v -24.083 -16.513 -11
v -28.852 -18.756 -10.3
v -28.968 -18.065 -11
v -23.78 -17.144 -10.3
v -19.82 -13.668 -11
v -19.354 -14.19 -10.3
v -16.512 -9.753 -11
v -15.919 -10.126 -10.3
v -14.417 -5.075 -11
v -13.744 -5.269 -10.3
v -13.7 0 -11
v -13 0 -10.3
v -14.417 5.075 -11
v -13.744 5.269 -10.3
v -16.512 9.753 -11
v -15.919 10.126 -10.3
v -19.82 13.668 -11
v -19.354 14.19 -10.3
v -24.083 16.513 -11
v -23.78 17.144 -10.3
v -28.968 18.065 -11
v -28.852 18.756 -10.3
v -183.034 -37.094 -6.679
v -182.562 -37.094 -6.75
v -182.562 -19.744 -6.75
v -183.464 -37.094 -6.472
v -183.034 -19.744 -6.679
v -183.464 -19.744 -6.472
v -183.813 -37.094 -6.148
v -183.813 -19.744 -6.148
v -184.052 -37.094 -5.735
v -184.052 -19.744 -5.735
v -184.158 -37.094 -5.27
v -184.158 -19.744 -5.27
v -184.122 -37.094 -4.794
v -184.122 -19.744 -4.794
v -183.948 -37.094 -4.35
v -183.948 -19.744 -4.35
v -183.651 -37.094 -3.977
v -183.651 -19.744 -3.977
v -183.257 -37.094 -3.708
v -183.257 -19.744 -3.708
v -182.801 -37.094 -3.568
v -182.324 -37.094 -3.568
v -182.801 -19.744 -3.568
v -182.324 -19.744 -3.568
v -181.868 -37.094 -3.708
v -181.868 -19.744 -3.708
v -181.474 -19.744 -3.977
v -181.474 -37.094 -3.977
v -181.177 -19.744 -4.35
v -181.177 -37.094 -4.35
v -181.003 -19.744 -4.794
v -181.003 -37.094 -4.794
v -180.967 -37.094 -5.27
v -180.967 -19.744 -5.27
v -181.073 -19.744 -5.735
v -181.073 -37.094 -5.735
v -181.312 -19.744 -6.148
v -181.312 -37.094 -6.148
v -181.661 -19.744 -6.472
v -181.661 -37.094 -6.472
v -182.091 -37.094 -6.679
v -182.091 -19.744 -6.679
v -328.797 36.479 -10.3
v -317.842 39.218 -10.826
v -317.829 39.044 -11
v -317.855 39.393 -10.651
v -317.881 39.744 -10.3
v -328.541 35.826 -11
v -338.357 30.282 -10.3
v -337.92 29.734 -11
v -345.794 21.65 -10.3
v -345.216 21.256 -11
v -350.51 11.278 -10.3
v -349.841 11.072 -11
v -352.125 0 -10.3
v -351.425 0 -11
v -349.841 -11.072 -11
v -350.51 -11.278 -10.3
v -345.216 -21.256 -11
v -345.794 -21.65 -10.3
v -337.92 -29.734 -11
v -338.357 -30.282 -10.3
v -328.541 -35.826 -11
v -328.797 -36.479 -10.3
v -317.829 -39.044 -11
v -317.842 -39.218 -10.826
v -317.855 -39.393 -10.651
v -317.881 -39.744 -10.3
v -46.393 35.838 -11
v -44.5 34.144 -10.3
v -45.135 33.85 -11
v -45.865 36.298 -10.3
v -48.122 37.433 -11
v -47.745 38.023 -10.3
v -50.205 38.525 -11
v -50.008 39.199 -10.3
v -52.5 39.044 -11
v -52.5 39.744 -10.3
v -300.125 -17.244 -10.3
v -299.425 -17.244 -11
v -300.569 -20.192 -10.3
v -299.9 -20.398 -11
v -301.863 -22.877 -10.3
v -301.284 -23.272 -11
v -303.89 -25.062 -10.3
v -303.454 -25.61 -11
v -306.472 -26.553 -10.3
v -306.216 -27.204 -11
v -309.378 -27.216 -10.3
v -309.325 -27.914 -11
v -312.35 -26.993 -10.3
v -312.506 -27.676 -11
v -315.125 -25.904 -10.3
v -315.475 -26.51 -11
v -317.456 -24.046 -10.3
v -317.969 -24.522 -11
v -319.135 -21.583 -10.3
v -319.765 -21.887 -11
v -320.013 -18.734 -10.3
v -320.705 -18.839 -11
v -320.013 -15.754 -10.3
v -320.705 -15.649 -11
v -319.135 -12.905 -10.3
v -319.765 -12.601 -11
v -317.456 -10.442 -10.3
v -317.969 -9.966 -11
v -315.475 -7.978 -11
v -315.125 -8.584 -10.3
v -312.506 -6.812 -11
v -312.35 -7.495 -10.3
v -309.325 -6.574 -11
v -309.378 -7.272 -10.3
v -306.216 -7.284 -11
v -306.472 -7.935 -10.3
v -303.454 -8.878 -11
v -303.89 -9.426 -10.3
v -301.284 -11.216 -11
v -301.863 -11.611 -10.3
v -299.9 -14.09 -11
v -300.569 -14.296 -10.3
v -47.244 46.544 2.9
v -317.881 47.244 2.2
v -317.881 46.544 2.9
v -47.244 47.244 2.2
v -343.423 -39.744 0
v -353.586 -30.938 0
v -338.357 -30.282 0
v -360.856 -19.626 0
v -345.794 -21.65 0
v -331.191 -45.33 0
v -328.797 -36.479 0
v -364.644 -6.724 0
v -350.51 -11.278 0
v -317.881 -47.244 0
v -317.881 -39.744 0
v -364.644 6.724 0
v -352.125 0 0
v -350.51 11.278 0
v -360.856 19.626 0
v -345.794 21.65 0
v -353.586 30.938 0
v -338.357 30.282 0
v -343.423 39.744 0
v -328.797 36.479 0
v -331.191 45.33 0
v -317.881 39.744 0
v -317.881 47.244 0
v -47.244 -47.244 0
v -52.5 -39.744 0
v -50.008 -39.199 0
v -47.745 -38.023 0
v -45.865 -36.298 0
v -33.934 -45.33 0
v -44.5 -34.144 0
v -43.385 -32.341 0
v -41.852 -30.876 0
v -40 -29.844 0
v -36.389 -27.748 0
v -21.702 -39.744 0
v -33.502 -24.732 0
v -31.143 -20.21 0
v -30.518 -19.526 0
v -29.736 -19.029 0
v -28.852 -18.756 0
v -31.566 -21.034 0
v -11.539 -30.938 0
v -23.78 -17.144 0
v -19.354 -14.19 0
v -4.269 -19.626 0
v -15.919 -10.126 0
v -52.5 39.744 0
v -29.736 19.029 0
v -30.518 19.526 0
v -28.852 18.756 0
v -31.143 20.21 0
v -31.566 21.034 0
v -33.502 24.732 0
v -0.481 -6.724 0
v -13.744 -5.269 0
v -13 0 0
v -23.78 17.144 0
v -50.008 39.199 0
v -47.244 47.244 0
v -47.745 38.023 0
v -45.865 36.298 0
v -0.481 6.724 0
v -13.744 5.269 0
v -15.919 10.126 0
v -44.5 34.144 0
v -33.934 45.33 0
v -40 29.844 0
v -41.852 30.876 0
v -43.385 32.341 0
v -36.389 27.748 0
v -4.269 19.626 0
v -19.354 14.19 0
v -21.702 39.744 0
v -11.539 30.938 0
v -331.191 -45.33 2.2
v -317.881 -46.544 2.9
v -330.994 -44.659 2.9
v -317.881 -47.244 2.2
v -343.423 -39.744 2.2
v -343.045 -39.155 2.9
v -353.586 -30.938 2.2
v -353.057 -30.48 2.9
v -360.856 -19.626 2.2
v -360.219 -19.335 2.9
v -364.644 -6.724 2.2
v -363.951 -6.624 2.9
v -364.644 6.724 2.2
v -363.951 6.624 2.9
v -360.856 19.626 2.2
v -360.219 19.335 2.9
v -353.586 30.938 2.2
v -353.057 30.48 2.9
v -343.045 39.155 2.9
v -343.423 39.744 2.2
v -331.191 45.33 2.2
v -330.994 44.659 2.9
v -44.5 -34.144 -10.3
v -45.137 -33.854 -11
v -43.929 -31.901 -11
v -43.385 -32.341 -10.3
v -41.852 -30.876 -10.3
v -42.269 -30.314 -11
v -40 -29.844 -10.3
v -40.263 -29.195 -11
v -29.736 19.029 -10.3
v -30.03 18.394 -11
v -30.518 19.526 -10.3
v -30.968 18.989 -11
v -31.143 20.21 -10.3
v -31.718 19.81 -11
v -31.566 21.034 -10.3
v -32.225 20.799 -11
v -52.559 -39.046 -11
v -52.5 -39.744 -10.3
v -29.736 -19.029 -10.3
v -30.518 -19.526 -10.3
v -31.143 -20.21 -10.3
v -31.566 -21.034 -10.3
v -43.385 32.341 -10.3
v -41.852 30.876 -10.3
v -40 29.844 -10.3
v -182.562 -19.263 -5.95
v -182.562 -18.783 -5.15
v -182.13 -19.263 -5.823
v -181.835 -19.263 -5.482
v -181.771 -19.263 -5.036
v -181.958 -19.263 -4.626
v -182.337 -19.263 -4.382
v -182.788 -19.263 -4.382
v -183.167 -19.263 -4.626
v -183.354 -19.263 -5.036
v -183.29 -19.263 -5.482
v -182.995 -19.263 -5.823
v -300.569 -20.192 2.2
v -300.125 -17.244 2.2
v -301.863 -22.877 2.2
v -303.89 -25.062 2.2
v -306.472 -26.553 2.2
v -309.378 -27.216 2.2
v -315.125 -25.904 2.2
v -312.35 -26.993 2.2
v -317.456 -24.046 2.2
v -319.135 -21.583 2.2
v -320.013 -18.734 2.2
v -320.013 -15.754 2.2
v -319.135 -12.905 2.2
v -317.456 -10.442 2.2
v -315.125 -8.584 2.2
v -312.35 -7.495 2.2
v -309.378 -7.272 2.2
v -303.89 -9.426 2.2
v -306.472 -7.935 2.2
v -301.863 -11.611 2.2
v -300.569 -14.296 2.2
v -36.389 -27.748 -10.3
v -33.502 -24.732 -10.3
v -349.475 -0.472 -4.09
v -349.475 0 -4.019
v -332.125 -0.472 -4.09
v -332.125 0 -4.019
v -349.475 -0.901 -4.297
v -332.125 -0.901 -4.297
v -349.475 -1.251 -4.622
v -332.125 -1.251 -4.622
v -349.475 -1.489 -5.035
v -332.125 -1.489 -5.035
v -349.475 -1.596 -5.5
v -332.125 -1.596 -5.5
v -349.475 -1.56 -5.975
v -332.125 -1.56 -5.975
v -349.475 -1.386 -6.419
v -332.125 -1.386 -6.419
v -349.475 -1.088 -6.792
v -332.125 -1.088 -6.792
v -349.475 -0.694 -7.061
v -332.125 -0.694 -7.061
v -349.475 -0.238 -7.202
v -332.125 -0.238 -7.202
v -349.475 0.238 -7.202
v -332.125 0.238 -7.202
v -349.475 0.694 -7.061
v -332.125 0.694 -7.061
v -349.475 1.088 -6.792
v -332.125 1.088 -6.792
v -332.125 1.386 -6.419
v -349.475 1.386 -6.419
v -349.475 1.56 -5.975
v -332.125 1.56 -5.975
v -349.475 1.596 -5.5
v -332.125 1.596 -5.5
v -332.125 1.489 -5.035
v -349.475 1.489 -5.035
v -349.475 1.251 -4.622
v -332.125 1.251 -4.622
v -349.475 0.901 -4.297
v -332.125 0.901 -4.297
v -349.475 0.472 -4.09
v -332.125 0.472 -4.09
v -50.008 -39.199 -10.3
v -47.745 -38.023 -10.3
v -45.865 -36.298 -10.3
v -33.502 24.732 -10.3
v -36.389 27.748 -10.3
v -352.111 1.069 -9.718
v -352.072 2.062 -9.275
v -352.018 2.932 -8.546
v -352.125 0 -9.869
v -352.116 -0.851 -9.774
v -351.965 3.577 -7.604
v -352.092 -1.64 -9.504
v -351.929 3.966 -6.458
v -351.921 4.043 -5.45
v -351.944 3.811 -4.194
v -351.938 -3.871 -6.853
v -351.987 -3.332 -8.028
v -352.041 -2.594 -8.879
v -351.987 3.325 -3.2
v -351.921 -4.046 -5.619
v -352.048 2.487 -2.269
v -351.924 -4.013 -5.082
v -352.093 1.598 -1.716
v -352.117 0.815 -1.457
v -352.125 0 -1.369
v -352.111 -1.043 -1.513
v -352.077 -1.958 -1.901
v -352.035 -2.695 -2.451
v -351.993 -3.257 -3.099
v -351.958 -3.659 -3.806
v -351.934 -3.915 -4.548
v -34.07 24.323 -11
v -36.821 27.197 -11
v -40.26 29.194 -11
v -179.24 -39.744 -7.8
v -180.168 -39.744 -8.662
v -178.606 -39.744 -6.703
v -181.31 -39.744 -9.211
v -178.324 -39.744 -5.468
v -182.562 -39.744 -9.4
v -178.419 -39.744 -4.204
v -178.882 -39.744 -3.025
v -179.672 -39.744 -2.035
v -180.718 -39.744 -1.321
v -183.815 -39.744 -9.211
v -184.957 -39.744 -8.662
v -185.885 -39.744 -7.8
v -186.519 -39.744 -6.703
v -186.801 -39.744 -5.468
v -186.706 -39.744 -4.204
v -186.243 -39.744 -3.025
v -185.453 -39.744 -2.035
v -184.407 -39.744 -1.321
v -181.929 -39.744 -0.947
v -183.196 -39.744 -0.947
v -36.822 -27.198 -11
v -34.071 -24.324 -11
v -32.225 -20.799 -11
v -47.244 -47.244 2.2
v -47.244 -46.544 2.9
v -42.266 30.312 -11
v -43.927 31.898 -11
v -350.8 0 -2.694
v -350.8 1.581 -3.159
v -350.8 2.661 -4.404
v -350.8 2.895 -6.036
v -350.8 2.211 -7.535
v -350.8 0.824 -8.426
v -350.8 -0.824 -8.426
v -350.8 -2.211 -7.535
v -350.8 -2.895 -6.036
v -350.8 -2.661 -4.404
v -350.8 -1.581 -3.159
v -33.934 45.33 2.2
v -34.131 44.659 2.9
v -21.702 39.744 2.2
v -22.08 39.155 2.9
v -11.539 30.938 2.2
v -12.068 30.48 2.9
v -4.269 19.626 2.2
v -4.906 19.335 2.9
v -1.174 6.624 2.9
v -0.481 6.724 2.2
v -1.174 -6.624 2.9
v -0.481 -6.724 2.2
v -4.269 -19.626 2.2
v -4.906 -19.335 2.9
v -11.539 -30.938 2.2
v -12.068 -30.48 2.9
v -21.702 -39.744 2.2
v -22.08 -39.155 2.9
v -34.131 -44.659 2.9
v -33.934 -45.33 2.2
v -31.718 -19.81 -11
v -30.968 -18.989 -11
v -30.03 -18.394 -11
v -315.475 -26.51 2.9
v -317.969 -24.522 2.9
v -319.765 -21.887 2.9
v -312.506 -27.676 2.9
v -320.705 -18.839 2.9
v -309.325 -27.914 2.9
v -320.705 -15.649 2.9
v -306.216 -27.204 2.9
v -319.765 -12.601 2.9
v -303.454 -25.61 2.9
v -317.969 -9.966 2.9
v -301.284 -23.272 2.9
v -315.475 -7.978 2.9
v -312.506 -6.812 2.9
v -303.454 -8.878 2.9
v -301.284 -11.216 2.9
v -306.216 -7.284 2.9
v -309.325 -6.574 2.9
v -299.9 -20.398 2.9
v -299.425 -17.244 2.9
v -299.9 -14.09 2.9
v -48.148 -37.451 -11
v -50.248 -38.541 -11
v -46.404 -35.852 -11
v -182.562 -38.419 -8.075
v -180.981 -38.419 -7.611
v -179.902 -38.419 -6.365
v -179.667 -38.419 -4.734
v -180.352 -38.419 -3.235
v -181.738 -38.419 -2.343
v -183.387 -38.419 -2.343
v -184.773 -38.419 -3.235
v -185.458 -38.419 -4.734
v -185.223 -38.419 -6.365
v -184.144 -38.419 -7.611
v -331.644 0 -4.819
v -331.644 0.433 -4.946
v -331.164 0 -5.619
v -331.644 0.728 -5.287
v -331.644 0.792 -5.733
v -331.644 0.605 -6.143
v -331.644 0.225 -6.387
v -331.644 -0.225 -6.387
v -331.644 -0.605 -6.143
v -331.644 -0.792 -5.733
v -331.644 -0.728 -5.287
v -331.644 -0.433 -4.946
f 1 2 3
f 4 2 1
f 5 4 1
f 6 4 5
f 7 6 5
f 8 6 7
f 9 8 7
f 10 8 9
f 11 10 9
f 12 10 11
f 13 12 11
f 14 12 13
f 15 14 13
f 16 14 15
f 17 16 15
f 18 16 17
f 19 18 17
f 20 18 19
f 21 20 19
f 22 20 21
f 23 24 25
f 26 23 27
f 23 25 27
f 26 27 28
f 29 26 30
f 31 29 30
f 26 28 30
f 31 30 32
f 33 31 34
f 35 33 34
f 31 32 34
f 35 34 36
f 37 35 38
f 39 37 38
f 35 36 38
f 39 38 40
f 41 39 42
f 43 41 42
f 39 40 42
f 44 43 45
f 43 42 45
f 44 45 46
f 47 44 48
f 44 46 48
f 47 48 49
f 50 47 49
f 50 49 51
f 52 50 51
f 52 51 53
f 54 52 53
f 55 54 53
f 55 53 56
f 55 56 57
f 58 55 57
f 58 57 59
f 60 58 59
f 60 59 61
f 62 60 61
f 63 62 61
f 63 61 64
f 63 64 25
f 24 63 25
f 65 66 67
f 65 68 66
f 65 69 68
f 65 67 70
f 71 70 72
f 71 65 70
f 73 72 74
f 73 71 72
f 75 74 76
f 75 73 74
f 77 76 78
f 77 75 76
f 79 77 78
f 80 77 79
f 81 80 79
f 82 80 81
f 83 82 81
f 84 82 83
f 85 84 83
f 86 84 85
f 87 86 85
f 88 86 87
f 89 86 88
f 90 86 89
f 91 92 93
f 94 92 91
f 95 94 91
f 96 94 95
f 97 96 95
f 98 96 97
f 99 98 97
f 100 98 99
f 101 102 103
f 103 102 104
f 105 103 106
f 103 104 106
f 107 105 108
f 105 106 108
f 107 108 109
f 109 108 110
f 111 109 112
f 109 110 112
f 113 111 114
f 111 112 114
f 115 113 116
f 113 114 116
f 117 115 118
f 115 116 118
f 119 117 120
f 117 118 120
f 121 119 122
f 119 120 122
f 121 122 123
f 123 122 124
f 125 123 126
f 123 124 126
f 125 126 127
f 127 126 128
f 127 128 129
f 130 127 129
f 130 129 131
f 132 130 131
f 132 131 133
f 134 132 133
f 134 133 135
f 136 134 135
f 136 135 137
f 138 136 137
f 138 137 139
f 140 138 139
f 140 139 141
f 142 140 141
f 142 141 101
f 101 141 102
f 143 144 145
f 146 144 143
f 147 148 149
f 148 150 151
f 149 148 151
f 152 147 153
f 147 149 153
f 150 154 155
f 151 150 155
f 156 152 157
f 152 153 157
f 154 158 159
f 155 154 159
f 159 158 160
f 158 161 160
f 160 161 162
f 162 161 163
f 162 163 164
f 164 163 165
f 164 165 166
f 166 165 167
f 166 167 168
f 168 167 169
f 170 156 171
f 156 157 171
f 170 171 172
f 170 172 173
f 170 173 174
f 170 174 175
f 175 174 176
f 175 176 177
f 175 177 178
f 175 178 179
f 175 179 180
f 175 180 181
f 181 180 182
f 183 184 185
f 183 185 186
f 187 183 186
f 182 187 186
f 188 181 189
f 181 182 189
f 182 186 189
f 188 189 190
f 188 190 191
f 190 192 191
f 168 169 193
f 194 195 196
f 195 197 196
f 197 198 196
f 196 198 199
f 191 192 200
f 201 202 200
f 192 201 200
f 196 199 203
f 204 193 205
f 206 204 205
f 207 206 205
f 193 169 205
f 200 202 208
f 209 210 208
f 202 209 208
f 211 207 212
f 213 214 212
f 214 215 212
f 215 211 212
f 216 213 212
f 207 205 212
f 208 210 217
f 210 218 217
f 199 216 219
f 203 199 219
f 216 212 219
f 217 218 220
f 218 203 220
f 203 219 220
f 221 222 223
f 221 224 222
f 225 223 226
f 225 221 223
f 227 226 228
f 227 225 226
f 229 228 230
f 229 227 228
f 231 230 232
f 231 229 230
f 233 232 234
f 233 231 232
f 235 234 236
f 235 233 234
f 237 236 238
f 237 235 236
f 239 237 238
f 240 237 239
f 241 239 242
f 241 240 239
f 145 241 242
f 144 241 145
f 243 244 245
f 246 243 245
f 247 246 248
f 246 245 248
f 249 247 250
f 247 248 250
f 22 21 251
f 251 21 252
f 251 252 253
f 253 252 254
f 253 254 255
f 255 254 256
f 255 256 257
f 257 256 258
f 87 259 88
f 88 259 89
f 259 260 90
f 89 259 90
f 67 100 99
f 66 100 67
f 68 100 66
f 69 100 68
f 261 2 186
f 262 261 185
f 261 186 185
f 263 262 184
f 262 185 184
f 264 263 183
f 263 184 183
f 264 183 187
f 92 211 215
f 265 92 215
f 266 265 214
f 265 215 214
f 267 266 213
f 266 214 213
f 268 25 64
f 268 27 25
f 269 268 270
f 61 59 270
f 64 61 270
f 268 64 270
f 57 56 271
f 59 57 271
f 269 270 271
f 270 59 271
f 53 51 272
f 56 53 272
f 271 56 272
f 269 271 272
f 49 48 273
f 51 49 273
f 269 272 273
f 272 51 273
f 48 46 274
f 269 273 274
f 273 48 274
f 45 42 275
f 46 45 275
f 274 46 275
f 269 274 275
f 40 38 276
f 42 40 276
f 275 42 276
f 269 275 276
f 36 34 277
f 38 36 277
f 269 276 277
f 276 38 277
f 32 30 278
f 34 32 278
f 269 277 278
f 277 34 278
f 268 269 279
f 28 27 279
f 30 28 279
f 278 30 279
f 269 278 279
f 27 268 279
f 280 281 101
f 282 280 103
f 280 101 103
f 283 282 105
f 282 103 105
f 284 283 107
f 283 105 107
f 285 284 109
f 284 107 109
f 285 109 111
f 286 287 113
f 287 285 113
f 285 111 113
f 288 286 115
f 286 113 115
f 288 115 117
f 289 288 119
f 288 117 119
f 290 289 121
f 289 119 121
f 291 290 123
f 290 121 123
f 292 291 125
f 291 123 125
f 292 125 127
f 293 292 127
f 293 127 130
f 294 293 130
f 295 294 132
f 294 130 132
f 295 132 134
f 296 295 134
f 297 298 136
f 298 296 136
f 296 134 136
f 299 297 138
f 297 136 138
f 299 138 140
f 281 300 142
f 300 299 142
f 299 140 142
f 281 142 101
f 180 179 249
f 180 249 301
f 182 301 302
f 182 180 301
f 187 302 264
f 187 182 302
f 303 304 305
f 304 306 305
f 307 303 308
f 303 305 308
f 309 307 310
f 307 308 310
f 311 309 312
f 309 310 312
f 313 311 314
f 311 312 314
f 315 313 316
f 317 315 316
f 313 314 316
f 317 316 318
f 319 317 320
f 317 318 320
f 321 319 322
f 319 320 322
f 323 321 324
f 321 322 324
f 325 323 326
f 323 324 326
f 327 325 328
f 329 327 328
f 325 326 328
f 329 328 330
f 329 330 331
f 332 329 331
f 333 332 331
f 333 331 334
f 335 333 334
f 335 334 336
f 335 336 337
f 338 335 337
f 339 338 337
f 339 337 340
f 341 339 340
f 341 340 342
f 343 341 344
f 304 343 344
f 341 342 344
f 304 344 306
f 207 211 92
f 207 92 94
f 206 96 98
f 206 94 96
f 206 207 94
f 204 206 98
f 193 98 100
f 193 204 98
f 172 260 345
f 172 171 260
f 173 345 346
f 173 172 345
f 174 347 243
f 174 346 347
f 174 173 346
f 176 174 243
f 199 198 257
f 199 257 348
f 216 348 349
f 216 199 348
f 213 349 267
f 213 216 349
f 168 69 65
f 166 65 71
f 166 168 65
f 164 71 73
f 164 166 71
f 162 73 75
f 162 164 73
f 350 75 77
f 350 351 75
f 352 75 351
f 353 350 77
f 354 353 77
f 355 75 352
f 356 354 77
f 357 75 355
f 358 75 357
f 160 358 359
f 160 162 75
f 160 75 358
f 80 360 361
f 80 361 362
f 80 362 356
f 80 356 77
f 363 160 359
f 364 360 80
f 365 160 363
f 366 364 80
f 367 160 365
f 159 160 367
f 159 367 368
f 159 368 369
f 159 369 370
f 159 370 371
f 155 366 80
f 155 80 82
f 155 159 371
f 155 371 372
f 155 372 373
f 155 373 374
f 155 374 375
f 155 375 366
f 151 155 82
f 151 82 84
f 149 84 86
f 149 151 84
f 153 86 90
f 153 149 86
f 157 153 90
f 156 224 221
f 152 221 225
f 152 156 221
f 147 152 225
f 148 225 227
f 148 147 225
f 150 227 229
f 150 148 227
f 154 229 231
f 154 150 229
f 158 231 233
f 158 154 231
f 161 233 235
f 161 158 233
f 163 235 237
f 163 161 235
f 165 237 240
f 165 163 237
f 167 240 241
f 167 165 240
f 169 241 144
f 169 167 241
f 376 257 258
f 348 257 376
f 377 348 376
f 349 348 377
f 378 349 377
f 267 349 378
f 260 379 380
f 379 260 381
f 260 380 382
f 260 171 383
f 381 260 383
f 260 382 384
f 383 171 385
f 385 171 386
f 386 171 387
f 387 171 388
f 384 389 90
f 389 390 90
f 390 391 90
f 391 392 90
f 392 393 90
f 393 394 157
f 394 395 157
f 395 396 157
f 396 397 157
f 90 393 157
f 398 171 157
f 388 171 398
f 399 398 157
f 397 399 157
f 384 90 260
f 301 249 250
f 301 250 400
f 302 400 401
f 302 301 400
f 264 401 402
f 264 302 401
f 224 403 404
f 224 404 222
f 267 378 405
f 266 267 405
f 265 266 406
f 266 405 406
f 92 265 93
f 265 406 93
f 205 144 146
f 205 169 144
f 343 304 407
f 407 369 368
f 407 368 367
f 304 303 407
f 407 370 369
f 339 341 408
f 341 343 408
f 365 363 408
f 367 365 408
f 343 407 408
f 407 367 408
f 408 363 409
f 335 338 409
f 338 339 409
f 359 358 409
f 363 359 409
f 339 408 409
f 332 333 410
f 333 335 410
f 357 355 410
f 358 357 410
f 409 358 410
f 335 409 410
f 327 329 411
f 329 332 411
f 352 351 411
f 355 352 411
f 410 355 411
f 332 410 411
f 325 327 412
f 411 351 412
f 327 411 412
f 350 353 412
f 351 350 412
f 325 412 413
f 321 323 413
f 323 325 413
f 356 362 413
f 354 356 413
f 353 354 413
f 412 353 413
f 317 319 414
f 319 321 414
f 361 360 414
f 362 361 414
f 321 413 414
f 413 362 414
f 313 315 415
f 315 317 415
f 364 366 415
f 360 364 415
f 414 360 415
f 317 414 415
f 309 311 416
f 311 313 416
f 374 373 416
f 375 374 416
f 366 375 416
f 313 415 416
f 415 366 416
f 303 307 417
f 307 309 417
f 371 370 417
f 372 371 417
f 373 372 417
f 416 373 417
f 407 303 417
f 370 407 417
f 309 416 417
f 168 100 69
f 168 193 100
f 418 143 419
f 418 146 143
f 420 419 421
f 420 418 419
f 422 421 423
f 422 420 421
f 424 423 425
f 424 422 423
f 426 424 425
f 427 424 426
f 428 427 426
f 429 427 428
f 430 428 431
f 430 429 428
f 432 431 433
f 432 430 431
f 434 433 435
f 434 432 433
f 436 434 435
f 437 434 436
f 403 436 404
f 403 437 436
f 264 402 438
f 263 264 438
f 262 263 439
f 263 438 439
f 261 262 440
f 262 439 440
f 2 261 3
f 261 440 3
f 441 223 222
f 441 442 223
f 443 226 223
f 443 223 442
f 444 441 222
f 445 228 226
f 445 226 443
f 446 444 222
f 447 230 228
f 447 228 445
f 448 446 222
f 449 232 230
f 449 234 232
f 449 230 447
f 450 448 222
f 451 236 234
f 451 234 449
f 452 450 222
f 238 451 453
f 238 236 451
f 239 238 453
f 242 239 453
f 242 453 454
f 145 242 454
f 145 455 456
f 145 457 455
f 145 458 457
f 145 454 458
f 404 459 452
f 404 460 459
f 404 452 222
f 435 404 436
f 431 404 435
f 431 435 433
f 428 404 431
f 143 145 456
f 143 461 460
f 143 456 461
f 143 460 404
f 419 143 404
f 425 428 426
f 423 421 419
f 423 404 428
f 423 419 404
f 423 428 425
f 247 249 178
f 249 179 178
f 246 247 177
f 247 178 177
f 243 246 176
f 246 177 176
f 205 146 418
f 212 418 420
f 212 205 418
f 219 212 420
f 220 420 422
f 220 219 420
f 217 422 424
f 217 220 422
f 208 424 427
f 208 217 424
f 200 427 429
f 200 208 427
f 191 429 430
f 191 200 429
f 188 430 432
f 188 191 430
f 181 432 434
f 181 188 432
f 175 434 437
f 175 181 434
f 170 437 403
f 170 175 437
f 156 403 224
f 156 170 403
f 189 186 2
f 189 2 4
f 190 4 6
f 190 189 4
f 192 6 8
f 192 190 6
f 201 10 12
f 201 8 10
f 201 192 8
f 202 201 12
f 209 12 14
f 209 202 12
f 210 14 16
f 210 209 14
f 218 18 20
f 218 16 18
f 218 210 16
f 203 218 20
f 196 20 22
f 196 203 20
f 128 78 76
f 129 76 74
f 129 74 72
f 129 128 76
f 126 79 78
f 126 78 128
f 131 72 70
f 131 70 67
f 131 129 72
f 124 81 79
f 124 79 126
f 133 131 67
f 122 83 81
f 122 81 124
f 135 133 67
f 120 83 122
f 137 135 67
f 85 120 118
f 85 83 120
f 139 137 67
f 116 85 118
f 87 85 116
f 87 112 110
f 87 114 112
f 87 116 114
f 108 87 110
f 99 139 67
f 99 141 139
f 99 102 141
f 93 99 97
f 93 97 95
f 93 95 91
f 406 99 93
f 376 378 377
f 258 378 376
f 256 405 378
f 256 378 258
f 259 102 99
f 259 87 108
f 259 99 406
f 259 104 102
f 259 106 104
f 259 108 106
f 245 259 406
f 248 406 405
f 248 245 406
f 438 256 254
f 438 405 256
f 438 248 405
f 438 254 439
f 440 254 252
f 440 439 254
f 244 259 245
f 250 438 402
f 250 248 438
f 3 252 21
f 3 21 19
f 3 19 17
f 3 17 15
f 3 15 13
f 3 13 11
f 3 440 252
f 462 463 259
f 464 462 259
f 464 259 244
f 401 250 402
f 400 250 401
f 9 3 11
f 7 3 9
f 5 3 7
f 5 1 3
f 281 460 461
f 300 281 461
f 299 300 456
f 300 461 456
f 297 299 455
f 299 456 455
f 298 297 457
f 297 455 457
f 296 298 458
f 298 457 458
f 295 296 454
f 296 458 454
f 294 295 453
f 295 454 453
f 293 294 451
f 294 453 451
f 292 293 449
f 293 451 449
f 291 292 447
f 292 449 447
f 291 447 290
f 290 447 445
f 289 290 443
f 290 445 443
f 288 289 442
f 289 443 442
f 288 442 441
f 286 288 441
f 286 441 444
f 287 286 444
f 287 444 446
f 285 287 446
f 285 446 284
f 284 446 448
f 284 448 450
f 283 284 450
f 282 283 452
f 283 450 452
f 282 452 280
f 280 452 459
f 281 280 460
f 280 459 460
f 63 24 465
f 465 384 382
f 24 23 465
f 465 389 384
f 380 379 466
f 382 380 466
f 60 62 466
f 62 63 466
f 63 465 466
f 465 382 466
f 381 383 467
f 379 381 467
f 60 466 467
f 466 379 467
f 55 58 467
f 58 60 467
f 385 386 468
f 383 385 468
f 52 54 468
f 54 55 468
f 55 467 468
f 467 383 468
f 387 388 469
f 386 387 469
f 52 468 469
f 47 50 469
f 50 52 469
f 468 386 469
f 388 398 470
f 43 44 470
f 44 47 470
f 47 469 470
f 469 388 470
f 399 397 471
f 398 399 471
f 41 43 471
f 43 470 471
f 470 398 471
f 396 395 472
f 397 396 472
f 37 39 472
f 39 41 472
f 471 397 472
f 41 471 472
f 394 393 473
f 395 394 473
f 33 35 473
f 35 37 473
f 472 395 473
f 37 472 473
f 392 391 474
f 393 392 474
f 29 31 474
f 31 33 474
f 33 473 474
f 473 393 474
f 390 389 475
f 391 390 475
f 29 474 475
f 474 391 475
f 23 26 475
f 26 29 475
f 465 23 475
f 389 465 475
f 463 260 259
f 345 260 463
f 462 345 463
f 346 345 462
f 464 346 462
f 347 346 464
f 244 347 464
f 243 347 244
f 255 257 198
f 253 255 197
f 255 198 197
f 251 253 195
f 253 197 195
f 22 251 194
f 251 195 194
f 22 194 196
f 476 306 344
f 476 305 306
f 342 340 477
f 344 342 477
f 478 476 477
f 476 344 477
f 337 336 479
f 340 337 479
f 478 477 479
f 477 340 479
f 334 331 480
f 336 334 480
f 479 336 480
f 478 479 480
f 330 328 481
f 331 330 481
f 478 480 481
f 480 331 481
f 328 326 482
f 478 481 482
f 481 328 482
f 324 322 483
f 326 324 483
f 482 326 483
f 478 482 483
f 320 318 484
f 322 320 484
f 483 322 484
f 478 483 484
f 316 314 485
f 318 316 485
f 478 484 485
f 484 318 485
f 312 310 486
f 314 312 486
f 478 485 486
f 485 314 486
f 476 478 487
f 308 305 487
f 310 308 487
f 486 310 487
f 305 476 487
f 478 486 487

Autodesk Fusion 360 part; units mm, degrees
sketch "Sketch1" plane through (0, 0, 0) normal (0, 0, 1) x (1, 0, 0)
  line L0 (0, 0) -> (-365.125, 0) construction
  line L1 (-365.125, 0) -> (-365.125, 47.244) construction
  line L2 (-365.125, 47.244) -> (0, 47.244) construction
  line L3 (0, 47.244) -> (0, -47.244) construction
  line L4 (0, -47.244) -> (-365.125, -47.244) construction
  line L5 (-365.125, -47.244) -> (-365.125, 47.244) construction
  line L6 (-47.244, 47.244) -> (-47.244, -47.244) construction
  arc A0 (-47.244, -47.244) -> (-47.244, 47.244) centre (-47.244, 0) ccw
  line L7 (-317.881, 47.244) -> (-317.881, -47.244) construction
  arc A1 (-317.881, 47.244) -> (-317.881, -47.244) centre (-317.881, 0) ccw
  line L8 (-317.881, 47.244) -> (-47.244, 47.244)
  line L9 (-47.244, -47.244) -> (-317.881, -47.244)
  line L10 (-365.125, -47.244) -> (-310.125, -47.244) construction
  line L11 (-310.125, -47.244) -> (-310.125, -17.244) construction
  line L12 (-310.125, -17.244) -> (-365.125, -17.244) construction
  line L13 (-365.125, -17.244) -> (-365.125, -47.244) construction
  circle A2 centre (-310.125, -17.244) radius 10
  dimension "d3" = 365.125
  dimension "d4" = 47.244
  dimension "d5" = 365.125
  dimension "d6" = 94.488
  dimension "d10" = 55
  dimension "d11" = 30
  dimension "d12" = 20
extrude "Extrude1" add sketch "Sketch1" along normal blind 2.9
sketch "Sketch2" plane through (0, 0, 0) normal (0, 0, -1) x (1, 0, 0)
  circle A0 centre (-310.125, 17.244) radius 10 construction
  arc A1 (-317.881, 47.244) -> (-317.881, -47.244) centre (-317.881, 0) ccw construction
  line L0 (-317.881, -47.244) -> (-47.244, -47.244) construction
  arc A2 (-47.244, -47.244) -> (-47.244, 47.244) centre (-47.244, 0) ccw construction
  line L1 (-47.244, 47.244) -> (-317.881, 47.244) construction
  line L2 (0, 0) -> (-365.125, 0) construction
  line L3 (0, 0) -> (-31, 0) construction
  line L4 (-31, 0) -> (-31, -100) construction
  line L5 (0, 0) -> (-52.5, 0) construction
  line L6 (-52.5, 0) -> (-52.5, -100) construction
  line L7 (-52.5, 0) -> (-44.5, 0) construction
  line L8 (-44.5, 0) -> (-44.5, -100) construction
  line L9 (-52.5, 0) -> (-40, 0) construction
  line L10 (-40, 0) -> (-40, -100) construction
  line L11 (-52.5, -47.244) -> (-52.5, -39.744) construction
  line L12 (-52.5, -39.744) -> (-52.5, -34.144) construction
  line L13 (-52.5, -39.744) -> (-52.5, -29.844) construction
  line L14 (-52.5, -39.744) -> (-52.5, -18.994) construction
  line L15 (-52.5, -39.744) -> (47.5, -39.744) construction
  line L16 (-52.5, -34.144) -> (47.5, -34.144) construction
  line L17 (-52.5, -29.844) -> (47.5, -29.844) construction
  line L18 (-52.5, -18.994) -> (47.5, -18.994) construction
  line L19 (-52.5, -39.744) -> (-317.881, -39.744)
  arc A3 (-52.5, -39.744) -> (-44.5, -34.144) centre (-53.3125, -30.069) ccw
  arc A4 (-40, -29.844) -> (-44.5, -34.144) centre (-36.8886, -37.6048) ccw
  arc A5 (-40, -29.844) -> (-31.5659, -21.0335) centre (-45.5992, -16.0418) ccw
  line L20 (0, 0) -> (-365.125, 0) construction
  arc A6 (-31.5659, 21.0335) -> (-40, 29.844) centre (-45.5992, 16.0418) ccw
  arc A7 (-44.5, 34.144) -> (-40, 29.844) centre (-36.8886, 37.6048) ccw
  arc A8 (-44.5, 34.144) -> (-52.5, 39.744) centre (-53.3125, 30.069) ccw
  line L21 (-52.5, 39.744) -> (-317.881, 39.744)
  line L22 (-31, -18.994) -> (-31, 18.994) construction
  line L23 (-317.881, -47.244) -> (-317.881, -39.744) construction
  line L24 (-365.125, 0) -> (-352.125, 0) construction
  arc A9 (-317.881, 39.744) -> (-317.881, -39.744) centre (-311.9393, 0) ccw
  line L25 (0, 0) -> (-13, 0) construction
  arc A10 (-28.8515, -18.7555) -> (-28.8515, 18.7555) centre (-32.0214, 0) ccw
  arc A11 (-28.8515, -18.7555) -> (-31.5659, -21.0335) centre (-28.2683, -22.2065) ccw
  arc A12 (-31.5659, 21.0335) -> (-28.8515, 18.7555) centre (-28.2683, 22.2065) ccw
  circle A13 centre (-310.125, 17.244) radius 10
  dimension "d22" = 31
  dimension "d23" = 52.5
  dimension "d24" = 100
  dimension "d25" = 100
  dimension "d26" = 8
  dimension "d27" = 100
  dimension "d28" = 12.5
  dimension "d29" = 100
  dimension "d34" = 7.5
  dimension "d35" = 5.6
  dimension "d36" = 9.9
  dimension "d37" = 20.75
  dimension "d38" = 100
  dimension "d39" = 100
  dimension "d40" = 100
  dimension "d41" = 100
  dimension "d42" = 7.5
  dimension "d43" = 13
  dimension "d44" = 13
  dimension "d45" = 3.5
extrude "Extrude2" add sketch "Sketch2" along normal blind 11
chamfer "Chamfer1" distance 0.7 angle 45 5 edges at (-182.5625, 47.244, 2.9) (-365.125, 0, 2.9) (-182.5625, -47.244, 2.9) (0, 0, 2.9) (-319.4483, -13.6278, 2.9)
chamfer "Chamfer1" distance 0.7 angle 45 13 edges at (-185.1905, -39.744, -11) (-352.125, 0, -11) (-47.7447, -38.023, -11) (-42.665, -31.5597, -11) (-34.8398, -26.3416, -11) (-34.8398, 26.3416, -11) (-30.5183, 19.5256, -11) (-13, 0, -11) (-30.5183, -19.5256, -11) (-42.665, 31.5597, -11) (-47.7447, 38.023, -11) (-185.1905, 39.744, -11) (-319.4483, -20.8602, -11)
sketch "Sketch3" plane through (0, -39.744, 0) normal (0, -1, 0) x (1, 0, 0)
  line L0 (-317.881, -10.3) -> (-52.5, -10.3)
  line L1 (-52.5, -10.3) -> (-52.5, 0)
  line L2 (-52.5, 0) -> (-317.881, 0)
  line L3 (-317.881, 0) -> (-317.881, -10.3)
  line L4 (-44.5, 0) -> (-40, 0)
  line L5 (-31.5659, 0) -> (-40, 0)
  line L6 (-31.5659, 0) -> (-28.8515, 0)
  line L7 (-13, 0) -> (-28.8515, 0)
  line L8 (-31.5659, 0) -> (-28.8515, 0)
  line L9 (-31.5659, 0) -> (-40, 0)
  line L10 (-44.5, 0) -> (-40, 0)
  line L11 (-44.5, 0) -> (-52.5, 0)
  line L12 (-52.5, 0) -> (-317.881, 0)
  line L13 (-317.881, 0) -> (-352.125, 0)
  line L14 (-317.881, 0) -> (-52.5, 0)
  line L15 (-44.5, 0) -> (-52.5, 0)
  line L16 (-317.881, 0) -> (-365.125, 0)
  line L17 (-317.881, 0) -> (-47.244, 0)
  line L18 (0, 0) -> (-47.244, 0)
  line L19 (-47.244, 0) -> (-317.881, 0)
  line L20 (-182.5625, 0) -> (-182.5625, -10.3) construction
  line L21 (-182.5625, 0) -> (-182.5625, -5.15) construction
hole "Hole1" at (-182.5625, -39.744, -5.15) direction (0, 1, 0) diameter 3.2 depth 20 tip angle 118 countersink diameter 8.5 countersink angle 90
ref_plane "WorkPlane1" through (-352.125, 0, 0) normal (1, 0, 0) x (0, 1, 0)
sketch "Sketch4" plane through (-352.125, 0, 0) normal (1, 0, 0) x (0, 1, 0)
  line L0 (39.044, -11) -> (-39.044, -11)
  line L1 (-39.744, 0) -> (39.744, 0)
  line L2 (0, 0) -> (0, -11)
  line L3 (0, 0) -> (0, -5.5)
hole "Hole2" at (-352.125, 0, -5.6194) direction (1, 0, 0) diameter 3.2 depth 20 tip angle 118 countersink diameter 8.5 countersink angle 90
equation "TopL = ( ( 14 + ( 3 / 8 ) ) * 25.4 ) * 1 mm" comment "Overall Length"
equation "TopW = ( 3.72 * 25.4 ) * 1 mm" comment "Overall Width"
equation "d3 = TopL"
equation "d4 = TopW / 2"
equation "d5 = TopL"
equation "d6 = TopW"
equation "HoleB = 30 mm" comment "Hole from Bottom"
equation "HoleR = 55 mm" comment "Hole From Right"
equation "HoleD = 20 mm" comment "Hole Diameter"
equation "TopT = 2.9 mm" comment "Top Thickness"
equation "d14 = TopT"
equation "TrailEndO = 13 mm" comment "Offset on left"
equation "TrailFC = 52.5 mm" comment "Beginning of first curve"
equation "TrailSC = 8 mm" comment "Beginning of Second Curve"
equation "TrailTC = 12.5 mm" comment "Beginning of Thrid Curve"
equation "TrailFlat = 31 mm"
equation "d22 = TrailFlat"
equation "d23 = TrailFC"
equation "d26 = TrailSC"
equation "d28 = TrailTC"
equation "TrailFW = 5.6 mm" comment "First Curve Width"
equation "TrailSW = 9.9 mm" comment "Second Curve Width"
equation "TrailTW = 20.75 mm" comment "Third Cure Width"
equation "BottomWO = 7.5 mm" comment "Bottom Width Offset"
equation "d34 = BottomWO"
equation "d35 = TrailFW"
equation "d36 = TrailSW"
equation "d37 = TrailTW"
equation "d42 = BottomWO"
equation "d43 = TrailEndO"
equation "d44 = TrailEndO"
equation "BottomT = 11 mm" comment "BottomThickness"
equation "d47 = BottomT"
equation "d55 = -TopL + TrailEndO"
